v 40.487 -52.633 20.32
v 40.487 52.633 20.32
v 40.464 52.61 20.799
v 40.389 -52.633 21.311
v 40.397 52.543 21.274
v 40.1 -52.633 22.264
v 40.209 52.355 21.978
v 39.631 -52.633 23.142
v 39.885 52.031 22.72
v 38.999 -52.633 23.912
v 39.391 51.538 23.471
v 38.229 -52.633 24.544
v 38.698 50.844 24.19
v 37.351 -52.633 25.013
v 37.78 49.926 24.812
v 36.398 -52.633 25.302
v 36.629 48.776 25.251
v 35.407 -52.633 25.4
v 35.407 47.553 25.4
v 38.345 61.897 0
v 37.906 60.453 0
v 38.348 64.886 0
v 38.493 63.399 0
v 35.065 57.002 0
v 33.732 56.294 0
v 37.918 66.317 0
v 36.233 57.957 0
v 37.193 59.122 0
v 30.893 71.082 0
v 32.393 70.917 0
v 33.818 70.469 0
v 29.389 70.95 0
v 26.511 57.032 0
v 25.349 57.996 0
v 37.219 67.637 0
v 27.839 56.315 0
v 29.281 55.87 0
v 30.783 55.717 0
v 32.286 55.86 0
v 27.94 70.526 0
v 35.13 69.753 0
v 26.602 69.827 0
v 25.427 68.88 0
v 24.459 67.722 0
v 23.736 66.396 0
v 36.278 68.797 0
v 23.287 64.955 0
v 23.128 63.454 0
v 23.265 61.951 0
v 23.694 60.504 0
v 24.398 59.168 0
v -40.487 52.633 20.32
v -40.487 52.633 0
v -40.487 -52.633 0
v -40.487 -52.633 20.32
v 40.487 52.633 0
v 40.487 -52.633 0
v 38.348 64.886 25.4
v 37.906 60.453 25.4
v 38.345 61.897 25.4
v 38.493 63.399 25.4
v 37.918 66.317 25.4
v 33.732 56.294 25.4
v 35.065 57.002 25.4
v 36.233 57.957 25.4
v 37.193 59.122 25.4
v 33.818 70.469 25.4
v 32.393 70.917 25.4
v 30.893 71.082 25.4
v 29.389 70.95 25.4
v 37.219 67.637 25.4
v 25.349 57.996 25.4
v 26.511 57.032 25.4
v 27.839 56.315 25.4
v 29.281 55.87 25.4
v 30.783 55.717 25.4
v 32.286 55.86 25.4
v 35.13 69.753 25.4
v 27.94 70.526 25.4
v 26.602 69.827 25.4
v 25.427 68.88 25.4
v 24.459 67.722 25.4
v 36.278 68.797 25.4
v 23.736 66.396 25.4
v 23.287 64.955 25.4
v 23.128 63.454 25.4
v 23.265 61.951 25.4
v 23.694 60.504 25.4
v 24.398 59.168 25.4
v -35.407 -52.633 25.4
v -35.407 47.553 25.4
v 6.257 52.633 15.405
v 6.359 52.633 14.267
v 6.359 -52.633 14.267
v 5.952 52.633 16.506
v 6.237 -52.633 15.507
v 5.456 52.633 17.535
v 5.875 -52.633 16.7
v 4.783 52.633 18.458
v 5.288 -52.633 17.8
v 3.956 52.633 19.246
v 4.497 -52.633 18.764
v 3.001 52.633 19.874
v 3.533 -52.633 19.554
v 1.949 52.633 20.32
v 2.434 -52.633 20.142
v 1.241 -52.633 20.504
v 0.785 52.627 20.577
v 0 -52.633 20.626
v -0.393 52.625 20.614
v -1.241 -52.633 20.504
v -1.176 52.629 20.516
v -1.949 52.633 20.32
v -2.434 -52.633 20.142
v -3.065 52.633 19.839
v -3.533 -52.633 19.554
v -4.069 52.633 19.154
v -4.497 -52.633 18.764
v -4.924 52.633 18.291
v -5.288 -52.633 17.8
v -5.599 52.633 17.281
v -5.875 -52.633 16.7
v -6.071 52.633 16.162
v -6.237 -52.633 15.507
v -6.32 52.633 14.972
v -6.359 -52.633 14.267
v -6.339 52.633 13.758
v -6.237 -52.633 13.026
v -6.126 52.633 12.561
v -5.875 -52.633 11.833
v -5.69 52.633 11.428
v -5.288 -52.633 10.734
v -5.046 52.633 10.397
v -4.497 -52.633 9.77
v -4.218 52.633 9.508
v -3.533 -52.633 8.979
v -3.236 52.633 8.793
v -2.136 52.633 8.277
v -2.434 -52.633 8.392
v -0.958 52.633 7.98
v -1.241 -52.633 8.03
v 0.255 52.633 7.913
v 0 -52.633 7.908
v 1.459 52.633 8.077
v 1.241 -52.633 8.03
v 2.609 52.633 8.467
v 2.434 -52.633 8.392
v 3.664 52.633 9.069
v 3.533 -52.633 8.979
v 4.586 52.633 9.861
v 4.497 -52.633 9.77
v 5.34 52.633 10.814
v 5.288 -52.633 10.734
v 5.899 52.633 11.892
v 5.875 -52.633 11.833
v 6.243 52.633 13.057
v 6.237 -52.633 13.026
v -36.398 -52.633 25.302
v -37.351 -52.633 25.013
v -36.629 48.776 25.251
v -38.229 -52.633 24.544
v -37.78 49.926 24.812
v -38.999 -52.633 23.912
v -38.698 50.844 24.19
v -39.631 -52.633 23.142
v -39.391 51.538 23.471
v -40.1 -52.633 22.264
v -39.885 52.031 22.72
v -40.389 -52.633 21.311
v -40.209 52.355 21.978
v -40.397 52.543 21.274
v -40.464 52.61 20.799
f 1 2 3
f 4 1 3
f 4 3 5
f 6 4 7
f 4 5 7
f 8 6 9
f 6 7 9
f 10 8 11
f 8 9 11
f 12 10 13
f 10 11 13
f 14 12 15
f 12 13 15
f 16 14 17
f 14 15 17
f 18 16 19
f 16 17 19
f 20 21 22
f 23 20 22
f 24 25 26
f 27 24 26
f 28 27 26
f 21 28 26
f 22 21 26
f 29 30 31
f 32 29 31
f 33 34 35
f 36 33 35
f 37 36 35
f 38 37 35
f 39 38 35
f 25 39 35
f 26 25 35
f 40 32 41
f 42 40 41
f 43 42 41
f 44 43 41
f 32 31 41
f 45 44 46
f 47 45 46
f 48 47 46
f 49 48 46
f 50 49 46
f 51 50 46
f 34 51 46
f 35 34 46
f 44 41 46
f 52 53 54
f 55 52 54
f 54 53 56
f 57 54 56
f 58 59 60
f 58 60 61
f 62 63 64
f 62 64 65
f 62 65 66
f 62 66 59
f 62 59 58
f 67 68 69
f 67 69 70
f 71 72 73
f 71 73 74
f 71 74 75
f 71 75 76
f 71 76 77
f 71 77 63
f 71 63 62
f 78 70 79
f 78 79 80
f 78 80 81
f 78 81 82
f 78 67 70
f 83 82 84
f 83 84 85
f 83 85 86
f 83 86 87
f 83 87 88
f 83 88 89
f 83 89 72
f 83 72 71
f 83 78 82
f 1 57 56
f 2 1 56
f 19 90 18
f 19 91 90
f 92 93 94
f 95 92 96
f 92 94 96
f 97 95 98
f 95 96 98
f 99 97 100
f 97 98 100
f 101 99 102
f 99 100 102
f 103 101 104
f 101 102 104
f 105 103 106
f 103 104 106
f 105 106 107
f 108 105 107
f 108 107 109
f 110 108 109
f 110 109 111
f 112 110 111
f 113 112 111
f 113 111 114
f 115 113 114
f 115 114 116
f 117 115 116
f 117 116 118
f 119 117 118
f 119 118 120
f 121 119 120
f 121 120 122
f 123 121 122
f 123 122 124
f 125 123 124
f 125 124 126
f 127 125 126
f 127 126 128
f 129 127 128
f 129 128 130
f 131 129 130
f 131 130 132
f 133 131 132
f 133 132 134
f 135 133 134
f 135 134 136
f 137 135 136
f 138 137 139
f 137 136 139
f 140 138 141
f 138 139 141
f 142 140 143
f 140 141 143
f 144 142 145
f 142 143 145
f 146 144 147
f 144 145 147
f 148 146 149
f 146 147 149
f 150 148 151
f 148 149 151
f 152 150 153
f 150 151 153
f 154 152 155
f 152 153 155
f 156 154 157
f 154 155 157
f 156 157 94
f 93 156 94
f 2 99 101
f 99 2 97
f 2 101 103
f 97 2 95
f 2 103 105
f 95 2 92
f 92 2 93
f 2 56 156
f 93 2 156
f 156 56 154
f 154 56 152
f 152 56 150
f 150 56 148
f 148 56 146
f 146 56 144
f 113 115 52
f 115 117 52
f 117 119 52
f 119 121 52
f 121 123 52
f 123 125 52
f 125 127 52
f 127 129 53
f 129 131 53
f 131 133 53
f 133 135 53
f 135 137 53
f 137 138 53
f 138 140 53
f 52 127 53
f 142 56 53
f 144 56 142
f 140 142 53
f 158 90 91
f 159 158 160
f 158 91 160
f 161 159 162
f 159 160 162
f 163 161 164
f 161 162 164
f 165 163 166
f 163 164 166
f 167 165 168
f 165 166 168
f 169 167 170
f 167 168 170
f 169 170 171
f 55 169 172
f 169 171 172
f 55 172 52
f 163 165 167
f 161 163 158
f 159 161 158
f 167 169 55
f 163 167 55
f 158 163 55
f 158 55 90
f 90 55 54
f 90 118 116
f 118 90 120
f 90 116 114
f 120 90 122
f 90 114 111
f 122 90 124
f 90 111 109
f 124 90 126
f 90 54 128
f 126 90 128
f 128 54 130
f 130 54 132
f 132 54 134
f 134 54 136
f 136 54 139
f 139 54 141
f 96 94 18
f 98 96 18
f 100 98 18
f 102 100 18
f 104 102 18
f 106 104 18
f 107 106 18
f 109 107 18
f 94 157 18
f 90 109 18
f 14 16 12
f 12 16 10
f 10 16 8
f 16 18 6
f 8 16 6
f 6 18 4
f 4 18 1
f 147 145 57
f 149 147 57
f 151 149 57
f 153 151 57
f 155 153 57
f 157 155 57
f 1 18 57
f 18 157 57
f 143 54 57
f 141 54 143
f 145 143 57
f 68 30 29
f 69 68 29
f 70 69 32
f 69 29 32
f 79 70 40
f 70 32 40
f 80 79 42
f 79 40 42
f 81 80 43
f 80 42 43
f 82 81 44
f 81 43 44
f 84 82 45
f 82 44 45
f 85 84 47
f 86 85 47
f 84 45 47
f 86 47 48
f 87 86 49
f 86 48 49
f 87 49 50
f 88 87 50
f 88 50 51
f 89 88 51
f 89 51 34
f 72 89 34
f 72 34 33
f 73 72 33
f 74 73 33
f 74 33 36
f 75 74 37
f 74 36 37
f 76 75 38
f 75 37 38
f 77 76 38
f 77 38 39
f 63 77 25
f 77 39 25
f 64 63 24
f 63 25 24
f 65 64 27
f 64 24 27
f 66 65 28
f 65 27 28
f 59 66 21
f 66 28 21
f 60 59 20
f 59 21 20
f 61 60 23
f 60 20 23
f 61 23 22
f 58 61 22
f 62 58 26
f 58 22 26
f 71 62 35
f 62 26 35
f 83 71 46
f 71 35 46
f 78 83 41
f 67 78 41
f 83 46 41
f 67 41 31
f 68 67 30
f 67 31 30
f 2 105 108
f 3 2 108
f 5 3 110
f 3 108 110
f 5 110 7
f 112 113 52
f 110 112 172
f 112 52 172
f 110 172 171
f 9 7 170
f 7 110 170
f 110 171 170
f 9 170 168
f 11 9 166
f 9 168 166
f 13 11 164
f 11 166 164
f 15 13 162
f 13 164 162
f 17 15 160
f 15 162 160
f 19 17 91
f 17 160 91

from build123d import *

# Parameters (mm, degrees)
F1_DEPTH    = 25.4
F2_R        = 6.3593196361
F3_DEPTH    = 119.38
F4_T1_DEPTH = 106.3739753604
F4_T3_DEPTH = 130.6661687136


# Not quite as in the source:
# - a fillet or chamfer that OpenCascade refuses, or shapes differently, is made with other operations: its cross-section is extruded or revolved along the edge and cut away or added


with BuildPart() as f1:
    # F0 (on Top) → F1 (new body)
    with BuildSketch(Plane.XY):
        Polygon((40.4869876802, 52.6330843568), (0, 52.6330843568), (-40.4869876802, 52.6330843568), (-40.4869876802, 0), (-40.4869876802, -52.6330843568), (0, -52.6330843568), (40.4869876802, -52.6330843568), (40.4869876802, 0), align=None)
    extrude(amount=F1_DEPTH)

    # F2 (on face) → F3 (cut)
    with BuildSketch(Plane.XZ.offset(52.6330843568)):
        with Locations((0, 14.2668439075)):
            Circle(F2_R)
    extrude(amount=-F3_DEPTH, mode=Mode.SUBTRACT)

    # F4: fillet of radius 5.08 on 3 edges, made by hand

    # F4_s2 → F4_t1 (cut)
    with BuildSketch(Plane.YZ.offset(-53.1869876802)):
        with BuildLine():
            ThreePointArc((52.6330843568, 20.32), (51.1451868052, 23.9121024484), (47.5530843568, 25.4))
            Line((47.5530843568, 25.4), (52.6330843568, 25.4))
            Line((52.6330843568, 25.4), (52.6330843568, 20.32))
        make_face()
    extrude(amount=F4_T1_DEPTH, mode=Mode.SUBTRACT)

    # F4_s4 → F4_t3 (cut)
    with BuildSketch(Plane.XZ.offset(-65.3330843568)):
        with BuildLine():
            ThreePointArc((-35.4069876802, 25.4), (-38.9990901286, 23.9121024484), (-40.4869876802, 20.32))
            Line((-40.4869876802, 20.32), (-40.4869876802, 25.4))
            Line((-40.4869876802, 25.4), (-35.4069876802, 25.4))
        make_face()
        with BuildLine():
            ThreePointArc((40.4869876802, 20.32), (38.9990901286, 23.9121024484), (35.4069876802, 25.4))
            Line((35.4069876802, 25.4), (40.4869876802, 25.4))
            Line((40.4869876802, 25.4), (40.4869876802, 20.32))
        make_face()
    extrude(amount=F4_T3_DEPTH, mode=Mode.SUBTRACT)


with BuildPart() as f1b:
    # F0 (on Top) → F1, piece 2 (new body)
    with BuildSketch(Plane.XY):
        with BuildLine():
            ThreePointArc((32.393171096, 70.9174290403), (24.8444423571, 58.5586318274), (38.4932589397, 63.3993941659))
            ThreePointArc((38.4932589397, 63.3993941659), (36.7764082606, 68.2401565045), (32.393171096, 70.9174290403))
        make_face()
    extrude(amount=F1_DEPTH)


solid = Compound([f1.part, f1b.part])
